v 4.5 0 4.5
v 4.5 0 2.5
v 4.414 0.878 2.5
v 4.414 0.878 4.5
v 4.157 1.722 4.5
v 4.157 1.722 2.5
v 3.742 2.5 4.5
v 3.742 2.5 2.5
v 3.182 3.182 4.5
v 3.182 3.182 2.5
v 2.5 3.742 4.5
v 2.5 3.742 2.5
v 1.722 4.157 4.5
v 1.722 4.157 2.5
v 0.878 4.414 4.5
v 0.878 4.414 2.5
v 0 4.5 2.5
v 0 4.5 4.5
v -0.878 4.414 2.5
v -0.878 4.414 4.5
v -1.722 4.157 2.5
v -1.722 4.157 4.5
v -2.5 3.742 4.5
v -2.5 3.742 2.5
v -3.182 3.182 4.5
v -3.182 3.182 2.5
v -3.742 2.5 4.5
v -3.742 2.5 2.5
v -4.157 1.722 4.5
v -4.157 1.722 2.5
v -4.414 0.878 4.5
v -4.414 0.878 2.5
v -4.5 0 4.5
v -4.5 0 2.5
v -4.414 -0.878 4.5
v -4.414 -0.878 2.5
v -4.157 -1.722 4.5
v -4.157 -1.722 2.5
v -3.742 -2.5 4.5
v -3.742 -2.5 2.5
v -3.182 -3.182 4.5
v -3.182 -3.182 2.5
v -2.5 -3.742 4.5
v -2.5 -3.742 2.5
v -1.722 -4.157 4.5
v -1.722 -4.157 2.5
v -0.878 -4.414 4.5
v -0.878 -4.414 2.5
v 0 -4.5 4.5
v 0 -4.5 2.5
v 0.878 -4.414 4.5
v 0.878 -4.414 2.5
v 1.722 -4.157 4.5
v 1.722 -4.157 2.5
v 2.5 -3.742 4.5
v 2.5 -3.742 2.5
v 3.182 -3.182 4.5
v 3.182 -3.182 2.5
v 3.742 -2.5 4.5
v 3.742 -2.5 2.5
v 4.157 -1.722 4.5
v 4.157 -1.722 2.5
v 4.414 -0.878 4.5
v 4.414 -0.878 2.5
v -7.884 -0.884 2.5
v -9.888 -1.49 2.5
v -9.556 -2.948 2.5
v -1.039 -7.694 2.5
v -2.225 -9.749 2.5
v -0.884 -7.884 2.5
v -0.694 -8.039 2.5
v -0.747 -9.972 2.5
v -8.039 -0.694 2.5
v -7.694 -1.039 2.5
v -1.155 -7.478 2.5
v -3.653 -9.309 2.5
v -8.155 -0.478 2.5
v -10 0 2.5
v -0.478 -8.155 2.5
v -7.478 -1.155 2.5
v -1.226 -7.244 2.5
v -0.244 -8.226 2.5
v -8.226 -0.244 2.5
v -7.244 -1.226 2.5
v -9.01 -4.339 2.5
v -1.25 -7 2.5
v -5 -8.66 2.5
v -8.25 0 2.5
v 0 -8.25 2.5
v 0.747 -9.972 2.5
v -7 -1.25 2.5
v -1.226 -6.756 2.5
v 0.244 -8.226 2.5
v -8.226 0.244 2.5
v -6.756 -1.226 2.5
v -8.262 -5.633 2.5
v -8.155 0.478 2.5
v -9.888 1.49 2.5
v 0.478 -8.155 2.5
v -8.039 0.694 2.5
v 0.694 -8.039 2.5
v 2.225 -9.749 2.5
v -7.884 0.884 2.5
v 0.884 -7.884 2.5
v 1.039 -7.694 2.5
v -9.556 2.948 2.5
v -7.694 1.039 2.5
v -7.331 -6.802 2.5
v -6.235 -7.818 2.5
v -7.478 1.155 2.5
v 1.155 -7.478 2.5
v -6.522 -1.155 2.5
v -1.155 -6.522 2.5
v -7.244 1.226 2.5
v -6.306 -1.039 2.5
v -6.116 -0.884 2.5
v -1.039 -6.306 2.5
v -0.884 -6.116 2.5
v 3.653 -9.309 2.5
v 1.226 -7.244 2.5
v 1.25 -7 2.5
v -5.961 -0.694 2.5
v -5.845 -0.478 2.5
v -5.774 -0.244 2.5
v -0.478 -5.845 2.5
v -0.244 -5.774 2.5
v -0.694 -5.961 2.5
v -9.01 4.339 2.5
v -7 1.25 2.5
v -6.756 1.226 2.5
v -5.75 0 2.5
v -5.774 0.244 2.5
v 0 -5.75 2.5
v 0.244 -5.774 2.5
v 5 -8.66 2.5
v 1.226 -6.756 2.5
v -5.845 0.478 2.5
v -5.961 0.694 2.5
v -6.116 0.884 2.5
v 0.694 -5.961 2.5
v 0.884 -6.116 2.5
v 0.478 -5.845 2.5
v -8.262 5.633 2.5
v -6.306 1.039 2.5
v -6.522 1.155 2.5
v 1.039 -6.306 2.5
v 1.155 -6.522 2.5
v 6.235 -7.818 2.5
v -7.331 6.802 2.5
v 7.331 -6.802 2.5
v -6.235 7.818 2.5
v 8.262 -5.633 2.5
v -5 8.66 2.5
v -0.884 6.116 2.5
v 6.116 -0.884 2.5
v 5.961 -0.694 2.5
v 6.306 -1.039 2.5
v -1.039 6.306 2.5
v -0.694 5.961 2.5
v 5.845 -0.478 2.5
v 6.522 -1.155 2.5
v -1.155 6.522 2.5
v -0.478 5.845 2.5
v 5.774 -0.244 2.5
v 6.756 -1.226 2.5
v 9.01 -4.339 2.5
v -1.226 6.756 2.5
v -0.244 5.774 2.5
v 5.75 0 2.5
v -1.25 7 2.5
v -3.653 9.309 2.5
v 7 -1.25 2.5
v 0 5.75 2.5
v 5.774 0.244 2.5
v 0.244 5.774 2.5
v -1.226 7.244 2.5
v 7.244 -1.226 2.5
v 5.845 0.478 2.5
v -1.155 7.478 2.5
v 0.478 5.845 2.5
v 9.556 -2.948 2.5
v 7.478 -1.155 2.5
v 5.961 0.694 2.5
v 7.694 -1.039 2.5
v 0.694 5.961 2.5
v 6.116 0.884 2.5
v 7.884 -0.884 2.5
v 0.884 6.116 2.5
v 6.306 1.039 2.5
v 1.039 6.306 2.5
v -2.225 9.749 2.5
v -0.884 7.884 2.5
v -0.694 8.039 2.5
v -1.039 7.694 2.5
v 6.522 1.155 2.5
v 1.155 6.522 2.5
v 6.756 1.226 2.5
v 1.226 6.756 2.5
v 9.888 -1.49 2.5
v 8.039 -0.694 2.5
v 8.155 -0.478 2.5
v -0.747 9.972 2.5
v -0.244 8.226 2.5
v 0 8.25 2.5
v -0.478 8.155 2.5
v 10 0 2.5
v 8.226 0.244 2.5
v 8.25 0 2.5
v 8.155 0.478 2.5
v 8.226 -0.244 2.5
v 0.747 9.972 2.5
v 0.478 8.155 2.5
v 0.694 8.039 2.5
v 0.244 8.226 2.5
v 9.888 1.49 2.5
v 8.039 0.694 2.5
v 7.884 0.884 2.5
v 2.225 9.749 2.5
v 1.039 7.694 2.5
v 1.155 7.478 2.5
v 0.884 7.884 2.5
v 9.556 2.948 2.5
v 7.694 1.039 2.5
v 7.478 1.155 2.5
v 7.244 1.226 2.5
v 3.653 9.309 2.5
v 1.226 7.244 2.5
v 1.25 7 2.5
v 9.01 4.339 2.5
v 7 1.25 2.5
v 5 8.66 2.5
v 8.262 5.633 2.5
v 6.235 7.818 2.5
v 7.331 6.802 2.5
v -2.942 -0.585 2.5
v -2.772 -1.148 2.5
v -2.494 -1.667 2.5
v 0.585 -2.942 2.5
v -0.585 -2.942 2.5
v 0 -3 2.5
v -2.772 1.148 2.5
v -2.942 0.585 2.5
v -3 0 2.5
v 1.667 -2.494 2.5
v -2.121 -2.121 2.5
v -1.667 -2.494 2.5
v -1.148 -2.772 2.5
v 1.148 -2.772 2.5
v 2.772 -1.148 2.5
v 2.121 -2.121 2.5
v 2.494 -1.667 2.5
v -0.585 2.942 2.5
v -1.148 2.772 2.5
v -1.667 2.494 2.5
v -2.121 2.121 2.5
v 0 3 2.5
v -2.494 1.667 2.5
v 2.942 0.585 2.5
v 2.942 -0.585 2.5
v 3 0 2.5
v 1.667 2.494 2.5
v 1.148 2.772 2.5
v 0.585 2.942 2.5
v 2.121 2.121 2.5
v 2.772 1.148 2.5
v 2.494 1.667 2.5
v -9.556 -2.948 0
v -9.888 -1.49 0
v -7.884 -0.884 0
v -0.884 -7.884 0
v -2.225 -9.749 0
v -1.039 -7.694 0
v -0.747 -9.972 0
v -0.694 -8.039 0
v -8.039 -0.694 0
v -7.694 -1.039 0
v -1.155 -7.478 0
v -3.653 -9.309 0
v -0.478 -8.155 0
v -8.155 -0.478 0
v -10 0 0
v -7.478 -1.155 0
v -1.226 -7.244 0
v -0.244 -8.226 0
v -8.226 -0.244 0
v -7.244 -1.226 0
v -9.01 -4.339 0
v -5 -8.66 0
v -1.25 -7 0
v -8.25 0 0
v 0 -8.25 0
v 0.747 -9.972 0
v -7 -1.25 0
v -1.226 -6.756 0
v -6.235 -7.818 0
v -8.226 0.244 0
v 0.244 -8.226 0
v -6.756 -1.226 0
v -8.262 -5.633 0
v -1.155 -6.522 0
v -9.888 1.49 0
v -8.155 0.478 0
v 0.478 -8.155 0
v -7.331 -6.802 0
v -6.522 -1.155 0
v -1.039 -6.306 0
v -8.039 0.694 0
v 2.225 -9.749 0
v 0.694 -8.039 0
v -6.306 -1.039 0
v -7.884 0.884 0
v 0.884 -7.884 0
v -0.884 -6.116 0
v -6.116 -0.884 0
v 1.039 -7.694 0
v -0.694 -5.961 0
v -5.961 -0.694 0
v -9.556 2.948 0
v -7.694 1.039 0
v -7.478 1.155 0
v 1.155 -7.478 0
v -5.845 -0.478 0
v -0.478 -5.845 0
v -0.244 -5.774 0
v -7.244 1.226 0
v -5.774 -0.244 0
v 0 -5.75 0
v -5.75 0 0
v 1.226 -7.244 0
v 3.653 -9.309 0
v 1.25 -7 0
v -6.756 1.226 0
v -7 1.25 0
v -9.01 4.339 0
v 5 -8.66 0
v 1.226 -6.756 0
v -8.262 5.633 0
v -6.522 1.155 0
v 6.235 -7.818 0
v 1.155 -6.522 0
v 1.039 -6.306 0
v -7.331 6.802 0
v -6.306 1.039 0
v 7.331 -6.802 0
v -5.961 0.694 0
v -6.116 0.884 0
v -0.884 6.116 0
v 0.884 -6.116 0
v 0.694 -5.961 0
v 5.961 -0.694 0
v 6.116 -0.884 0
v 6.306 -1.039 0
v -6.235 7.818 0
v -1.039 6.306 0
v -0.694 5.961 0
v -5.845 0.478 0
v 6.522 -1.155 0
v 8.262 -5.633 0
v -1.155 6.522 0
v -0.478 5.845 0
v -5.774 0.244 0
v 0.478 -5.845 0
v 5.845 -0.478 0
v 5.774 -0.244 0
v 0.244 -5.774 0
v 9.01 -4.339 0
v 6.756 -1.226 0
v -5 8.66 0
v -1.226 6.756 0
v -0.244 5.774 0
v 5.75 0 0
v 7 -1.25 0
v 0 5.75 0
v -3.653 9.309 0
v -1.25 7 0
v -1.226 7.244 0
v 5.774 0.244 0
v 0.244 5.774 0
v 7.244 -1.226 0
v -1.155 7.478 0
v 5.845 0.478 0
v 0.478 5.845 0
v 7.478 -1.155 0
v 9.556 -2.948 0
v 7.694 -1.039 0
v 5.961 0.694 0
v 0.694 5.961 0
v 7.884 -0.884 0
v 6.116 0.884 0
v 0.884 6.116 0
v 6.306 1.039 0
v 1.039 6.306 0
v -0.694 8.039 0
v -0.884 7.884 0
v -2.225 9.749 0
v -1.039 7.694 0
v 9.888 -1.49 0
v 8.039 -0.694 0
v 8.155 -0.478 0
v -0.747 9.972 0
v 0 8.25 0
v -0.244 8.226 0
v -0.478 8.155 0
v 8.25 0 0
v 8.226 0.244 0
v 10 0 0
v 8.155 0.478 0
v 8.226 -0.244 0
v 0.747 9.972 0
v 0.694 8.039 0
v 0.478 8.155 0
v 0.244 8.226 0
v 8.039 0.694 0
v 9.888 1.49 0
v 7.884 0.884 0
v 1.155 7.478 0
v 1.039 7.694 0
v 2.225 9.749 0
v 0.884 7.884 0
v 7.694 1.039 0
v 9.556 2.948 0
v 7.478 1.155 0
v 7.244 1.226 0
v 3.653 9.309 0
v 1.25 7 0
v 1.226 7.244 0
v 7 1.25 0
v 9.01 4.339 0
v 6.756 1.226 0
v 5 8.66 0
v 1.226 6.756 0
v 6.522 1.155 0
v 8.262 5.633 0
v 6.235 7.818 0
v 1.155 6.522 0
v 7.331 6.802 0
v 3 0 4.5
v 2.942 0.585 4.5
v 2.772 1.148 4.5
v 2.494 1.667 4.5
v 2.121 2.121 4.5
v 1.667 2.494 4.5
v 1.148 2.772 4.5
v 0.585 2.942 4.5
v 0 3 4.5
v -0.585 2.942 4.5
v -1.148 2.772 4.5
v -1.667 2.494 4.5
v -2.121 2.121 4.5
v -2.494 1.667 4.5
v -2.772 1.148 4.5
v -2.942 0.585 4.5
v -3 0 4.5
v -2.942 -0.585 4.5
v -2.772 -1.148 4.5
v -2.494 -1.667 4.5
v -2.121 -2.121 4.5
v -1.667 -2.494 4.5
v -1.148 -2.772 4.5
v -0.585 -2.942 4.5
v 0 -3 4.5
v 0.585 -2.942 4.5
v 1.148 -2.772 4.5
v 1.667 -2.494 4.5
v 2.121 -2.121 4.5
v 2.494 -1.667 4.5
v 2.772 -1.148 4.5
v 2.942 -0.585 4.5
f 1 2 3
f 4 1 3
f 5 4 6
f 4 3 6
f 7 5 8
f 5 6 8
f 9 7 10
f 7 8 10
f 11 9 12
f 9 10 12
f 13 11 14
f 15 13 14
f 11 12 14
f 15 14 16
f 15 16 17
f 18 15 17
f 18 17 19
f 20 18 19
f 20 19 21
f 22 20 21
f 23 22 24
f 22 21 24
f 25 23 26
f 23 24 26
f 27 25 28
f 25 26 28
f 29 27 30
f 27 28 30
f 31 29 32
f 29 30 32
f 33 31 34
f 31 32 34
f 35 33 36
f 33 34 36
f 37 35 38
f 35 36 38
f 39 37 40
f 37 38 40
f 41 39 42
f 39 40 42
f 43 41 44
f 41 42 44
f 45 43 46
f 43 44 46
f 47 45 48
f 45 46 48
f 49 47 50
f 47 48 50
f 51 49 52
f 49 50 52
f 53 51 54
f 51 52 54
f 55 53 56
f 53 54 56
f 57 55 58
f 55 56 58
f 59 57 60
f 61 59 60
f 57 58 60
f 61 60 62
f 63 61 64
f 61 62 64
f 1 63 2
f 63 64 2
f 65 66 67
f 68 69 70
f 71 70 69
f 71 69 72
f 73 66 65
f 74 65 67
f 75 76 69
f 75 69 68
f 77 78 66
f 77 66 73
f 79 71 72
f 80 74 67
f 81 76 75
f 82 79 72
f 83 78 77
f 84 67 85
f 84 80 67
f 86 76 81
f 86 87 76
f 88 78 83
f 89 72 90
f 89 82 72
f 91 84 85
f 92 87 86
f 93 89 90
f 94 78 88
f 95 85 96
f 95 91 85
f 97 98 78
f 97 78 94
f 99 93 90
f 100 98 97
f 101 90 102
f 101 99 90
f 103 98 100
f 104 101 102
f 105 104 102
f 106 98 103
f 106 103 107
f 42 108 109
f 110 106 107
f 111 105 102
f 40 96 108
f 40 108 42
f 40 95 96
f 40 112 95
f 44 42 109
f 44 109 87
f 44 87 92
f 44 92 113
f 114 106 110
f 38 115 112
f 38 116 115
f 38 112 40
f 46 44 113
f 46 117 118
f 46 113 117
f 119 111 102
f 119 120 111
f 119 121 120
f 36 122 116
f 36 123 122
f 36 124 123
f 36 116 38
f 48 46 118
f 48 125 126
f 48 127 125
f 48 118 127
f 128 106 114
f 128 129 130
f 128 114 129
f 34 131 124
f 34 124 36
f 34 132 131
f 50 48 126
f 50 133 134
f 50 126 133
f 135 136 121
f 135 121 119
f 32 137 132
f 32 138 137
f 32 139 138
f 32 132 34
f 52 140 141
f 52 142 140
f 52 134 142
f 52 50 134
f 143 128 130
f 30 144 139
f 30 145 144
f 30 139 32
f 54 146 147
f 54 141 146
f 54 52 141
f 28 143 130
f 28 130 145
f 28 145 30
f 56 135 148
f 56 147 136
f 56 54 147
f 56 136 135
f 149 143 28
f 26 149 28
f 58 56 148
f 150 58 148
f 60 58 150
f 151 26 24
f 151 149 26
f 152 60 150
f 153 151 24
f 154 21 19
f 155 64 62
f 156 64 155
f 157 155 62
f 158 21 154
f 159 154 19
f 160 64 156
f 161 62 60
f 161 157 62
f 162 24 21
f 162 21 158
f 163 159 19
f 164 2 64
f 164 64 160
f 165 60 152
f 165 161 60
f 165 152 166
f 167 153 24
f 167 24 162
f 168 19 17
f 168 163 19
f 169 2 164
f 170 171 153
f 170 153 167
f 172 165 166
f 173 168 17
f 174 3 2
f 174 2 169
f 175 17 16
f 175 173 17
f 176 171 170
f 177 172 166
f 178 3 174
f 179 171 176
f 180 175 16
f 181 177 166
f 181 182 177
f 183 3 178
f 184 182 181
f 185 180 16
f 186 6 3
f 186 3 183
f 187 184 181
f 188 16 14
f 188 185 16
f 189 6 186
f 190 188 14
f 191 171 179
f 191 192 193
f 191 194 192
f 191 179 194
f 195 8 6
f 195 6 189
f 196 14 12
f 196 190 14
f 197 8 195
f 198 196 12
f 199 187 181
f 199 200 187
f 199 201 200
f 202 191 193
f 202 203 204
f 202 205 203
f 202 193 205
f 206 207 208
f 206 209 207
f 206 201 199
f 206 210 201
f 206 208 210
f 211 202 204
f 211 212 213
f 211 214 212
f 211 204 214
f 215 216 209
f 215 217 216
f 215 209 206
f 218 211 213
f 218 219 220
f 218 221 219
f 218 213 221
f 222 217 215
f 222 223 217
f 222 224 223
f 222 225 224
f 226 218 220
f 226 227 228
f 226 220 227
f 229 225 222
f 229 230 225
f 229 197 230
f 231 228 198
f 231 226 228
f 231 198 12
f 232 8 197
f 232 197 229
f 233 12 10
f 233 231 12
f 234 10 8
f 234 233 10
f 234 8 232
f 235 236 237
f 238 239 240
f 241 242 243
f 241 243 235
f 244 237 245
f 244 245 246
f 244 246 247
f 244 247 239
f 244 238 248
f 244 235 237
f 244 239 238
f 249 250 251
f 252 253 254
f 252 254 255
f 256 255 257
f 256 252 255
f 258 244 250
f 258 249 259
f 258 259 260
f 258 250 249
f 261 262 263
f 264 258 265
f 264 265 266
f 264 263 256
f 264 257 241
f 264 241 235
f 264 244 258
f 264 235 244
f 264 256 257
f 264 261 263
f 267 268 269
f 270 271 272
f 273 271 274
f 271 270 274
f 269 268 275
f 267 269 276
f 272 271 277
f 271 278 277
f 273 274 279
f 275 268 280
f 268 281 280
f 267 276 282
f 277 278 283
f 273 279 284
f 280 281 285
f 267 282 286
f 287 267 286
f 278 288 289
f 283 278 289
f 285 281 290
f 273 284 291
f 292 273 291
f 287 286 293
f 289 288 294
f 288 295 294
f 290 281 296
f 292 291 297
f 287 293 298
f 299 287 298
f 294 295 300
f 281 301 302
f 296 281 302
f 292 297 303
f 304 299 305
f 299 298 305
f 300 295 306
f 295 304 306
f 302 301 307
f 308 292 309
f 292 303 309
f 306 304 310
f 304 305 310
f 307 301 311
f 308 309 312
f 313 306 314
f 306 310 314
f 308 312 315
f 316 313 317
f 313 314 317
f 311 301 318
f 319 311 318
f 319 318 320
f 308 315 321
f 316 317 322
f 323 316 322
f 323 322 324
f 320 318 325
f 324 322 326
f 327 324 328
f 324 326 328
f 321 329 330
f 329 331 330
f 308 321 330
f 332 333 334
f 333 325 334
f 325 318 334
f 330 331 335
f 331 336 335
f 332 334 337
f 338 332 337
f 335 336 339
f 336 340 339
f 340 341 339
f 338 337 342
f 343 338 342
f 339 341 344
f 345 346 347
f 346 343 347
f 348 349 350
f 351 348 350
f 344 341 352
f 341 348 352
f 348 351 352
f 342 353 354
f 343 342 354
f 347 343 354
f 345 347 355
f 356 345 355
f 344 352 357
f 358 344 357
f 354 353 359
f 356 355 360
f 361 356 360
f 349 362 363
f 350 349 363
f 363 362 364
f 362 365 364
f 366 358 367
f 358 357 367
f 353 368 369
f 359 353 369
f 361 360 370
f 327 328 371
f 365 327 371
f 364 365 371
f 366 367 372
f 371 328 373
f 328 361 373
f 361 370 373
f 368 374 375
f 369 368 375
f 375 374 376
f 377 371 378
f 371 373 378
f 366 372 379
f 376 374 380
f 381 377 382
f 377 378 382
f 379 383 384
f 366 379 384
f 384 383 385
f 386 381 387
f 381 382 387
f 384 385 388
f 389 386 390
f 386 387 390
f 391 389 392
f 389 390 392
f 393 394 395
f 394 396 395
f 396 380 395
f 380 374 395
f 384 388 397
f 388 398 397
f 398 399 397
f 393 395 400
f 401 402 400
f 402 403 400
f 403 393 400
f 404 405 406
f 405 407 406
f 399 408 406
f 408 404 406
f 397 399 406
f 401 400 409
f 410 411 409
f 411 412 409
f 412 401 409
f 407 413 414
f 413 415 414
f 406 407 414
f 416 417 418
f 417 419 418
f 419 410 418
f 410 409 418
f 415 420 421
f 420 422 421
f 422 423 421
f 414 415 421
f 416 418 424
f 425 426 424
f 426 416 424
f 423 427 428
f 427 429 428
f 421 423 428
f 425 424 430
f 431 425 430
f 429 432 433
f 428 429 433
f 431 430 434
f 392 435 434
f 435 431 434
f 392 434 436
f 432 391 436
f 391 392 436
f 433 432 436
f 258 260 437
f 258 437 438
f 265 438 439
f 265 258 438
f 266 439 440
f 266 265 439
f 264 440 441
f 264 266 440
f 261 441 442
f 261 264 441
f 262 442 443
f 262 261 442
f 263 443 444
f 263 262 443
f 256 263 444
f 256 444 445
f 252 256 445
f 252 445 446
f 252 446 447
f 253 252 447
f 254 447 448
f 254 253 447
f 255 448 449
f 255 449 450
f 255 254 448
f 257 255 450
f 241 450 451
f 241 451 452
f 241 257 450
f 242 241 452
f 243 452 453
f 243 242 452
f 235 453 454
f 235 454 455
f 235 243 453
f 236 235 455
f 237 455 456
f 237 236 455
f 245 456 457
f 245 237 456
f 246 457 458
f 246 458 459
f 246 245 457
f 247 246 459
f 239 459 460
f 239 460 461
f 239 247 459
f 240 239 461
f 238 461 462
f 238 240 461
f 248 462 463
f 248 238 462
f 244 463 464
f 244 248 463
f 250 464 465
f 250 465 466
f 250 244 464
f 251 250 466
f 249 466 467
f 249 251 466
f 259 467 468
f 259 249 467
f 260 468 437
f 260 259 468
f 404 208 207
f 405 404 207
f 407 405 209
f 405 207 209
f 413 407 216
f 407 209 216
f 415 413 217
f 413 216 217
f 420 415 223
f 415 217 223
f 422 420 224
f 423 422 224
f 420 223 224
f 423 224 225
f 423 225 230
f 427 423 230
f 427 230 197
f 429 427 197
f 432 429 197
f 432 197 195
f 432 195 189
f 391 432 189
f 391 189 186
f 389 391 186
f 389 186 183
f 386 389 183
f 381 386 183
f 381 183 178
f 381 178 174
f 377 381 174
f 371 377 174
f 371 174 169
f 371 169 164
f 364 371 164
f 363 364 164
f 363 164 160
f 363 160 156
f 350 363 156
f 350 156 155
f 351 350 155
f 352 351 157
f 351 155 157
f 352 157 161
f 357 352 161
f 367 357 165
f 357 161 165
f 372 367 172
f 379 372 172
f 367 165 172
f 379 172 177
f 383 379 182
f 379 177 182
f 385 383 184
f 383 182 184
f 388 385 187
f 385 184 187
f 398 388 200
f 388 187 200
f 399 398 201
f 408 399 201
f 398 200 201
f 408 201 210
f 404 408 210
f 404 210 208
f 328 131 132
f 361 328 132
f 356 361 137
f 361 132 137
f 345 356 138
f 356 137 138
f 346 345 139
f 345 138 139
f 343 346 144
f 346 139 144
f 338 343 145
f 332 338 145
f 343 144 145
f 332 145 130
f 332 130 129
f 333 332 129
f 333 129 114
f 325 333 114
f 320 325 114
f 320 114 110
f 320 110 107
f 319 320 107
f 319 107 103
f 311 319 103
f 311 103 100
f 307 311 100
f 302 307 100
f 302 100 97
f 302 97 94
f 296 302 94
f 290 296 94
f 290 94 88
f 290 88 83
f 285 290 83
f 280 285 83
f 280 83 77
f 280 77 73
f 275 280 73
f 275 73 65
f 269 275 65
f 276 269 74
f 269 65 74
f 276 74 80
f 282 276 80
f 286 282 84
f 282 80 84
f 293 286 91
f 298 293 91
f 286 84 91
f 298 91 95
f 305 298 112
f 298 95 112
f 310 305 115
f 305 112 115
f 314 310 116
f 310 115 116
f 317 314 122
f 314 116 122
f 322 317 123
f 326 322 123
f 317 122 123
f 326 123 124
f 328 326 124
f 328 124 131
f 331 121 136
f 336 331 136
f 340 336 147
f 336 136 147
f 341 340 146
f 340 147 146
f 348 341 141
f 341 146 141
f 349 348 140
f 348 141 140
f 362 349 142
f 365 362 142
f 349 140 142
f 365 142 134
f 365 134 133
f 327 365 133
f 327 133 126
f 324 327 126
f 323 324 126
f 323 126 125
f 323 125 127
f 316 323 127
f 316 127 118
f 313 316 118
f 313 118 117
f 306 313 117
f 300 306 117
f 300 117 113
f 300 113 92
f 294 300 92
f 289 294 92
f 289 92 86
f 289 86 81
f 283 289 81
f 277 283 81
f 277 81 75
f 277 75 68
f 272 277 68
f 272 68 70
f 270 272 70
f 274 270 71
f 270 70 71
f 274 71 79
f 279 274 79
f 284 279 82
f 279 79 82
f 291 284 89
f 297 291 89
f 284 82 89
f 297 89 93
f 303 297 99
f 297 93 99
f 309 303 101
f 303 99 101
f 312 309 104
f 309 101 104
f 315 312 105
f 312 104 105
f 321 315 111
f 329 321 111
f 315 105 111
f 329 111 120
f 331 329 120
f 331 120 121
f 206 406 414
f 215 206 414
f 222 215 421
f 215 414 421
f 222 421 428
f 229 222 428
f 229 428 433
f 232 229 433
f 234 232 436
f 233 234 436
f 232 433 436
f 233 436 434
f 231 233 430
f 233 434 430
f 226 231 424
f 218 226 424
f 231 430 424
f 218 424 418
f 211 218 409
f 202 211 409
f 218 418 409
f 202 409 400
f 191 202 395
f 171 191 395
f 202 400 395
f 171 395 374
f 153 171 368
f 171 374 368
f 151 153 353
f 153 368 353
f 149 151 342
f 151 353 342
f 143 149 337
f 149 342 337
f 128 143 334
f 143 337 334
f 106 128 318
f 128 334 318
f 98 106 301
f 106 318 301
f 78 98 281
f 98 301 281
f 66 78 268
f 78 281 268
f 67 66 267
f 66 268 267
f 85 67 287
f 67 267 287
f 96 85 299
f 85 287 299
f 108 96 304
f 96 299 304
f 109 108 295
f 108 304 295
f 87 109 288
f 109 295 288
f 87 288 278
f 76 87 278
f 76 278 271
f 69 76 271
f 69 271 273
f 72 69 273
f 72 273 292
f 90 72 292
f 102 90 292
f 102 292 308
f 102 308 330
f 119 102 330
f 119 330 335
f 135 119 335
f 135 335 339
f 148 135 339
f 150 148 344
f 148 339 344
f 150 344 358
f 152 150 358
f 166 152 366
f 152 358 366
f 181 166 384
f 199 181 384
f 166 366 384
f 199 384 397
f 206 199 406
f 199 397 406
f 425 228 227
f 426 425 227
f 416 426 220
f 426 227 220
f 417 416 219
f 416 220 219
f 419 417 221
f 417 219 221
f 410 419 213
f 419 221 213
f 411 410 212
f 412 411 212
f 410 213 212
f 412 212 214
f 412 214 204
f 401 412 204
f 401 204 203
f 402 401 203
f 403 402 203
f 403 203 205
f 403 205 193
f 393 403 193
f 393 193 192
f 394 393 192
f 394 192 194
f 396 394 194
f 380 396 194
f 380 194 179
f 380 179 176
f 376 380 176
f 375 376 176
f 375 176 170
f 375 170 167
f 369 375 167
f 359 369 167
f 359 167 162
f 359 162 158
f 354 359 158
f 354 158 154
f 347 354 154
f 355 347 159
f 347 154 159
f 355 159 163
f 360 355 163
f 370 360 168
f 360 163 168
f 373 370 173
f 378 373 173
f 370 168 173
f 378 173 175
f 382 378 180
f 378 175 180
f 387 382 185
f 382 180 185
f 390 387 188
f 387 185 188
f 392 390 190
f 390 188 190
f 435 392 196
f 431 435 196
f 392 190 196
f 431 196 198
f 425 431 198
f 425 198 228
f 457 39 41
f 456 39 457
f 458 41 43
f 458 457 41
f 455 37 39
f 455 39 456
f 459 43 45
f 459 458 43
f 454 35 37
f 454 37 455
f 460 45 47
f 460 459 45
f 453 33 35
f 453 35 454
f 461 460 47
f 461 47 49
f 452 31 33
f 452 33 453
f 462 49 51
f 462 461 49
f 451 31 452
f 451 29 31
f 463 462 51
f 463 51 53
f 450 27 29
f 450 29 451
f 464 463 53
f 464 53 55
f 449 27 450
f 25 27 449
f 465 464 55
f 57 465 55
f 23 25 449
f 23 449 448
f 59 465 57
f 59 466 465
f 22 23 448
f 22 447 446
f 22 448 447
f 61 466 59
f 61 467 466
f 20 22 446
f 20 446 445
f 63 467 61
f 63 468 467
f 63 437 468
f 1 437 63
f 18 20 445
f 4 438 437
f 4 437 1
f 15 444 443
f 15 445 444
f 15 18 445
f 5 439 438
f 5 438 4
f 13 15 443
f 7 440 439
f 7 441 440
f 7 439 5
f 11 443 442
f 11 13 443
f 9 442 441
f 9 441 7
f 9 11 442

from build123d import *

# Parameters (mm, degrees)
SKETCH_1_R          = 10
EXTRUDE_1_DEPTH     = 2.5
SKETCH_2_R          = 4.5
SKETCH_2_R_2        = 3
EXTRUDE_2_DEPTH     = 2
SKETCH_3_R          = 1.25
CUT_EXTRUDE_1_DEPTH = 15.361406616


with BuildPart() as part:
    # 草图1 → 凸台-拉伸1 (new body)
    with BuildSketch(Plane.XY):
        Circle(SKETCH_1_R)
    extrude(amount=EXTRUDE_1_DEPTH)

    # 草图2 → 凸台-拉伸2 (add)
    with BuildSketch(Plane.XY.offset(2.5)):
        Circle(SKETCH_2_R)
        Circle(SKETCH_2_R_2, mode=Mode.SUBTRACT)
    extrude(amount=EXTRUDE_2_DEPTH)

    # 草图3 → 切除-拉伸1 (cut, through all)
    with BuildSketch(Plane.XY.offset(2.5)):
        with Locations((0, 7)):
            Circle(SKETCH_3_R)
        with Locations((7, 0)):
            Circle(SKETCH_3_R)
        with Locations((0, -7)):
            Circle(SKETCH_3_R)
        with Locations((-7, 0)):
            Circle(SKETCH_3_R)
    extrude(amount=-CUT_EXTRUDE_1_DEPTH, mode=Mode.SUBTRACT)


solid = part.part
